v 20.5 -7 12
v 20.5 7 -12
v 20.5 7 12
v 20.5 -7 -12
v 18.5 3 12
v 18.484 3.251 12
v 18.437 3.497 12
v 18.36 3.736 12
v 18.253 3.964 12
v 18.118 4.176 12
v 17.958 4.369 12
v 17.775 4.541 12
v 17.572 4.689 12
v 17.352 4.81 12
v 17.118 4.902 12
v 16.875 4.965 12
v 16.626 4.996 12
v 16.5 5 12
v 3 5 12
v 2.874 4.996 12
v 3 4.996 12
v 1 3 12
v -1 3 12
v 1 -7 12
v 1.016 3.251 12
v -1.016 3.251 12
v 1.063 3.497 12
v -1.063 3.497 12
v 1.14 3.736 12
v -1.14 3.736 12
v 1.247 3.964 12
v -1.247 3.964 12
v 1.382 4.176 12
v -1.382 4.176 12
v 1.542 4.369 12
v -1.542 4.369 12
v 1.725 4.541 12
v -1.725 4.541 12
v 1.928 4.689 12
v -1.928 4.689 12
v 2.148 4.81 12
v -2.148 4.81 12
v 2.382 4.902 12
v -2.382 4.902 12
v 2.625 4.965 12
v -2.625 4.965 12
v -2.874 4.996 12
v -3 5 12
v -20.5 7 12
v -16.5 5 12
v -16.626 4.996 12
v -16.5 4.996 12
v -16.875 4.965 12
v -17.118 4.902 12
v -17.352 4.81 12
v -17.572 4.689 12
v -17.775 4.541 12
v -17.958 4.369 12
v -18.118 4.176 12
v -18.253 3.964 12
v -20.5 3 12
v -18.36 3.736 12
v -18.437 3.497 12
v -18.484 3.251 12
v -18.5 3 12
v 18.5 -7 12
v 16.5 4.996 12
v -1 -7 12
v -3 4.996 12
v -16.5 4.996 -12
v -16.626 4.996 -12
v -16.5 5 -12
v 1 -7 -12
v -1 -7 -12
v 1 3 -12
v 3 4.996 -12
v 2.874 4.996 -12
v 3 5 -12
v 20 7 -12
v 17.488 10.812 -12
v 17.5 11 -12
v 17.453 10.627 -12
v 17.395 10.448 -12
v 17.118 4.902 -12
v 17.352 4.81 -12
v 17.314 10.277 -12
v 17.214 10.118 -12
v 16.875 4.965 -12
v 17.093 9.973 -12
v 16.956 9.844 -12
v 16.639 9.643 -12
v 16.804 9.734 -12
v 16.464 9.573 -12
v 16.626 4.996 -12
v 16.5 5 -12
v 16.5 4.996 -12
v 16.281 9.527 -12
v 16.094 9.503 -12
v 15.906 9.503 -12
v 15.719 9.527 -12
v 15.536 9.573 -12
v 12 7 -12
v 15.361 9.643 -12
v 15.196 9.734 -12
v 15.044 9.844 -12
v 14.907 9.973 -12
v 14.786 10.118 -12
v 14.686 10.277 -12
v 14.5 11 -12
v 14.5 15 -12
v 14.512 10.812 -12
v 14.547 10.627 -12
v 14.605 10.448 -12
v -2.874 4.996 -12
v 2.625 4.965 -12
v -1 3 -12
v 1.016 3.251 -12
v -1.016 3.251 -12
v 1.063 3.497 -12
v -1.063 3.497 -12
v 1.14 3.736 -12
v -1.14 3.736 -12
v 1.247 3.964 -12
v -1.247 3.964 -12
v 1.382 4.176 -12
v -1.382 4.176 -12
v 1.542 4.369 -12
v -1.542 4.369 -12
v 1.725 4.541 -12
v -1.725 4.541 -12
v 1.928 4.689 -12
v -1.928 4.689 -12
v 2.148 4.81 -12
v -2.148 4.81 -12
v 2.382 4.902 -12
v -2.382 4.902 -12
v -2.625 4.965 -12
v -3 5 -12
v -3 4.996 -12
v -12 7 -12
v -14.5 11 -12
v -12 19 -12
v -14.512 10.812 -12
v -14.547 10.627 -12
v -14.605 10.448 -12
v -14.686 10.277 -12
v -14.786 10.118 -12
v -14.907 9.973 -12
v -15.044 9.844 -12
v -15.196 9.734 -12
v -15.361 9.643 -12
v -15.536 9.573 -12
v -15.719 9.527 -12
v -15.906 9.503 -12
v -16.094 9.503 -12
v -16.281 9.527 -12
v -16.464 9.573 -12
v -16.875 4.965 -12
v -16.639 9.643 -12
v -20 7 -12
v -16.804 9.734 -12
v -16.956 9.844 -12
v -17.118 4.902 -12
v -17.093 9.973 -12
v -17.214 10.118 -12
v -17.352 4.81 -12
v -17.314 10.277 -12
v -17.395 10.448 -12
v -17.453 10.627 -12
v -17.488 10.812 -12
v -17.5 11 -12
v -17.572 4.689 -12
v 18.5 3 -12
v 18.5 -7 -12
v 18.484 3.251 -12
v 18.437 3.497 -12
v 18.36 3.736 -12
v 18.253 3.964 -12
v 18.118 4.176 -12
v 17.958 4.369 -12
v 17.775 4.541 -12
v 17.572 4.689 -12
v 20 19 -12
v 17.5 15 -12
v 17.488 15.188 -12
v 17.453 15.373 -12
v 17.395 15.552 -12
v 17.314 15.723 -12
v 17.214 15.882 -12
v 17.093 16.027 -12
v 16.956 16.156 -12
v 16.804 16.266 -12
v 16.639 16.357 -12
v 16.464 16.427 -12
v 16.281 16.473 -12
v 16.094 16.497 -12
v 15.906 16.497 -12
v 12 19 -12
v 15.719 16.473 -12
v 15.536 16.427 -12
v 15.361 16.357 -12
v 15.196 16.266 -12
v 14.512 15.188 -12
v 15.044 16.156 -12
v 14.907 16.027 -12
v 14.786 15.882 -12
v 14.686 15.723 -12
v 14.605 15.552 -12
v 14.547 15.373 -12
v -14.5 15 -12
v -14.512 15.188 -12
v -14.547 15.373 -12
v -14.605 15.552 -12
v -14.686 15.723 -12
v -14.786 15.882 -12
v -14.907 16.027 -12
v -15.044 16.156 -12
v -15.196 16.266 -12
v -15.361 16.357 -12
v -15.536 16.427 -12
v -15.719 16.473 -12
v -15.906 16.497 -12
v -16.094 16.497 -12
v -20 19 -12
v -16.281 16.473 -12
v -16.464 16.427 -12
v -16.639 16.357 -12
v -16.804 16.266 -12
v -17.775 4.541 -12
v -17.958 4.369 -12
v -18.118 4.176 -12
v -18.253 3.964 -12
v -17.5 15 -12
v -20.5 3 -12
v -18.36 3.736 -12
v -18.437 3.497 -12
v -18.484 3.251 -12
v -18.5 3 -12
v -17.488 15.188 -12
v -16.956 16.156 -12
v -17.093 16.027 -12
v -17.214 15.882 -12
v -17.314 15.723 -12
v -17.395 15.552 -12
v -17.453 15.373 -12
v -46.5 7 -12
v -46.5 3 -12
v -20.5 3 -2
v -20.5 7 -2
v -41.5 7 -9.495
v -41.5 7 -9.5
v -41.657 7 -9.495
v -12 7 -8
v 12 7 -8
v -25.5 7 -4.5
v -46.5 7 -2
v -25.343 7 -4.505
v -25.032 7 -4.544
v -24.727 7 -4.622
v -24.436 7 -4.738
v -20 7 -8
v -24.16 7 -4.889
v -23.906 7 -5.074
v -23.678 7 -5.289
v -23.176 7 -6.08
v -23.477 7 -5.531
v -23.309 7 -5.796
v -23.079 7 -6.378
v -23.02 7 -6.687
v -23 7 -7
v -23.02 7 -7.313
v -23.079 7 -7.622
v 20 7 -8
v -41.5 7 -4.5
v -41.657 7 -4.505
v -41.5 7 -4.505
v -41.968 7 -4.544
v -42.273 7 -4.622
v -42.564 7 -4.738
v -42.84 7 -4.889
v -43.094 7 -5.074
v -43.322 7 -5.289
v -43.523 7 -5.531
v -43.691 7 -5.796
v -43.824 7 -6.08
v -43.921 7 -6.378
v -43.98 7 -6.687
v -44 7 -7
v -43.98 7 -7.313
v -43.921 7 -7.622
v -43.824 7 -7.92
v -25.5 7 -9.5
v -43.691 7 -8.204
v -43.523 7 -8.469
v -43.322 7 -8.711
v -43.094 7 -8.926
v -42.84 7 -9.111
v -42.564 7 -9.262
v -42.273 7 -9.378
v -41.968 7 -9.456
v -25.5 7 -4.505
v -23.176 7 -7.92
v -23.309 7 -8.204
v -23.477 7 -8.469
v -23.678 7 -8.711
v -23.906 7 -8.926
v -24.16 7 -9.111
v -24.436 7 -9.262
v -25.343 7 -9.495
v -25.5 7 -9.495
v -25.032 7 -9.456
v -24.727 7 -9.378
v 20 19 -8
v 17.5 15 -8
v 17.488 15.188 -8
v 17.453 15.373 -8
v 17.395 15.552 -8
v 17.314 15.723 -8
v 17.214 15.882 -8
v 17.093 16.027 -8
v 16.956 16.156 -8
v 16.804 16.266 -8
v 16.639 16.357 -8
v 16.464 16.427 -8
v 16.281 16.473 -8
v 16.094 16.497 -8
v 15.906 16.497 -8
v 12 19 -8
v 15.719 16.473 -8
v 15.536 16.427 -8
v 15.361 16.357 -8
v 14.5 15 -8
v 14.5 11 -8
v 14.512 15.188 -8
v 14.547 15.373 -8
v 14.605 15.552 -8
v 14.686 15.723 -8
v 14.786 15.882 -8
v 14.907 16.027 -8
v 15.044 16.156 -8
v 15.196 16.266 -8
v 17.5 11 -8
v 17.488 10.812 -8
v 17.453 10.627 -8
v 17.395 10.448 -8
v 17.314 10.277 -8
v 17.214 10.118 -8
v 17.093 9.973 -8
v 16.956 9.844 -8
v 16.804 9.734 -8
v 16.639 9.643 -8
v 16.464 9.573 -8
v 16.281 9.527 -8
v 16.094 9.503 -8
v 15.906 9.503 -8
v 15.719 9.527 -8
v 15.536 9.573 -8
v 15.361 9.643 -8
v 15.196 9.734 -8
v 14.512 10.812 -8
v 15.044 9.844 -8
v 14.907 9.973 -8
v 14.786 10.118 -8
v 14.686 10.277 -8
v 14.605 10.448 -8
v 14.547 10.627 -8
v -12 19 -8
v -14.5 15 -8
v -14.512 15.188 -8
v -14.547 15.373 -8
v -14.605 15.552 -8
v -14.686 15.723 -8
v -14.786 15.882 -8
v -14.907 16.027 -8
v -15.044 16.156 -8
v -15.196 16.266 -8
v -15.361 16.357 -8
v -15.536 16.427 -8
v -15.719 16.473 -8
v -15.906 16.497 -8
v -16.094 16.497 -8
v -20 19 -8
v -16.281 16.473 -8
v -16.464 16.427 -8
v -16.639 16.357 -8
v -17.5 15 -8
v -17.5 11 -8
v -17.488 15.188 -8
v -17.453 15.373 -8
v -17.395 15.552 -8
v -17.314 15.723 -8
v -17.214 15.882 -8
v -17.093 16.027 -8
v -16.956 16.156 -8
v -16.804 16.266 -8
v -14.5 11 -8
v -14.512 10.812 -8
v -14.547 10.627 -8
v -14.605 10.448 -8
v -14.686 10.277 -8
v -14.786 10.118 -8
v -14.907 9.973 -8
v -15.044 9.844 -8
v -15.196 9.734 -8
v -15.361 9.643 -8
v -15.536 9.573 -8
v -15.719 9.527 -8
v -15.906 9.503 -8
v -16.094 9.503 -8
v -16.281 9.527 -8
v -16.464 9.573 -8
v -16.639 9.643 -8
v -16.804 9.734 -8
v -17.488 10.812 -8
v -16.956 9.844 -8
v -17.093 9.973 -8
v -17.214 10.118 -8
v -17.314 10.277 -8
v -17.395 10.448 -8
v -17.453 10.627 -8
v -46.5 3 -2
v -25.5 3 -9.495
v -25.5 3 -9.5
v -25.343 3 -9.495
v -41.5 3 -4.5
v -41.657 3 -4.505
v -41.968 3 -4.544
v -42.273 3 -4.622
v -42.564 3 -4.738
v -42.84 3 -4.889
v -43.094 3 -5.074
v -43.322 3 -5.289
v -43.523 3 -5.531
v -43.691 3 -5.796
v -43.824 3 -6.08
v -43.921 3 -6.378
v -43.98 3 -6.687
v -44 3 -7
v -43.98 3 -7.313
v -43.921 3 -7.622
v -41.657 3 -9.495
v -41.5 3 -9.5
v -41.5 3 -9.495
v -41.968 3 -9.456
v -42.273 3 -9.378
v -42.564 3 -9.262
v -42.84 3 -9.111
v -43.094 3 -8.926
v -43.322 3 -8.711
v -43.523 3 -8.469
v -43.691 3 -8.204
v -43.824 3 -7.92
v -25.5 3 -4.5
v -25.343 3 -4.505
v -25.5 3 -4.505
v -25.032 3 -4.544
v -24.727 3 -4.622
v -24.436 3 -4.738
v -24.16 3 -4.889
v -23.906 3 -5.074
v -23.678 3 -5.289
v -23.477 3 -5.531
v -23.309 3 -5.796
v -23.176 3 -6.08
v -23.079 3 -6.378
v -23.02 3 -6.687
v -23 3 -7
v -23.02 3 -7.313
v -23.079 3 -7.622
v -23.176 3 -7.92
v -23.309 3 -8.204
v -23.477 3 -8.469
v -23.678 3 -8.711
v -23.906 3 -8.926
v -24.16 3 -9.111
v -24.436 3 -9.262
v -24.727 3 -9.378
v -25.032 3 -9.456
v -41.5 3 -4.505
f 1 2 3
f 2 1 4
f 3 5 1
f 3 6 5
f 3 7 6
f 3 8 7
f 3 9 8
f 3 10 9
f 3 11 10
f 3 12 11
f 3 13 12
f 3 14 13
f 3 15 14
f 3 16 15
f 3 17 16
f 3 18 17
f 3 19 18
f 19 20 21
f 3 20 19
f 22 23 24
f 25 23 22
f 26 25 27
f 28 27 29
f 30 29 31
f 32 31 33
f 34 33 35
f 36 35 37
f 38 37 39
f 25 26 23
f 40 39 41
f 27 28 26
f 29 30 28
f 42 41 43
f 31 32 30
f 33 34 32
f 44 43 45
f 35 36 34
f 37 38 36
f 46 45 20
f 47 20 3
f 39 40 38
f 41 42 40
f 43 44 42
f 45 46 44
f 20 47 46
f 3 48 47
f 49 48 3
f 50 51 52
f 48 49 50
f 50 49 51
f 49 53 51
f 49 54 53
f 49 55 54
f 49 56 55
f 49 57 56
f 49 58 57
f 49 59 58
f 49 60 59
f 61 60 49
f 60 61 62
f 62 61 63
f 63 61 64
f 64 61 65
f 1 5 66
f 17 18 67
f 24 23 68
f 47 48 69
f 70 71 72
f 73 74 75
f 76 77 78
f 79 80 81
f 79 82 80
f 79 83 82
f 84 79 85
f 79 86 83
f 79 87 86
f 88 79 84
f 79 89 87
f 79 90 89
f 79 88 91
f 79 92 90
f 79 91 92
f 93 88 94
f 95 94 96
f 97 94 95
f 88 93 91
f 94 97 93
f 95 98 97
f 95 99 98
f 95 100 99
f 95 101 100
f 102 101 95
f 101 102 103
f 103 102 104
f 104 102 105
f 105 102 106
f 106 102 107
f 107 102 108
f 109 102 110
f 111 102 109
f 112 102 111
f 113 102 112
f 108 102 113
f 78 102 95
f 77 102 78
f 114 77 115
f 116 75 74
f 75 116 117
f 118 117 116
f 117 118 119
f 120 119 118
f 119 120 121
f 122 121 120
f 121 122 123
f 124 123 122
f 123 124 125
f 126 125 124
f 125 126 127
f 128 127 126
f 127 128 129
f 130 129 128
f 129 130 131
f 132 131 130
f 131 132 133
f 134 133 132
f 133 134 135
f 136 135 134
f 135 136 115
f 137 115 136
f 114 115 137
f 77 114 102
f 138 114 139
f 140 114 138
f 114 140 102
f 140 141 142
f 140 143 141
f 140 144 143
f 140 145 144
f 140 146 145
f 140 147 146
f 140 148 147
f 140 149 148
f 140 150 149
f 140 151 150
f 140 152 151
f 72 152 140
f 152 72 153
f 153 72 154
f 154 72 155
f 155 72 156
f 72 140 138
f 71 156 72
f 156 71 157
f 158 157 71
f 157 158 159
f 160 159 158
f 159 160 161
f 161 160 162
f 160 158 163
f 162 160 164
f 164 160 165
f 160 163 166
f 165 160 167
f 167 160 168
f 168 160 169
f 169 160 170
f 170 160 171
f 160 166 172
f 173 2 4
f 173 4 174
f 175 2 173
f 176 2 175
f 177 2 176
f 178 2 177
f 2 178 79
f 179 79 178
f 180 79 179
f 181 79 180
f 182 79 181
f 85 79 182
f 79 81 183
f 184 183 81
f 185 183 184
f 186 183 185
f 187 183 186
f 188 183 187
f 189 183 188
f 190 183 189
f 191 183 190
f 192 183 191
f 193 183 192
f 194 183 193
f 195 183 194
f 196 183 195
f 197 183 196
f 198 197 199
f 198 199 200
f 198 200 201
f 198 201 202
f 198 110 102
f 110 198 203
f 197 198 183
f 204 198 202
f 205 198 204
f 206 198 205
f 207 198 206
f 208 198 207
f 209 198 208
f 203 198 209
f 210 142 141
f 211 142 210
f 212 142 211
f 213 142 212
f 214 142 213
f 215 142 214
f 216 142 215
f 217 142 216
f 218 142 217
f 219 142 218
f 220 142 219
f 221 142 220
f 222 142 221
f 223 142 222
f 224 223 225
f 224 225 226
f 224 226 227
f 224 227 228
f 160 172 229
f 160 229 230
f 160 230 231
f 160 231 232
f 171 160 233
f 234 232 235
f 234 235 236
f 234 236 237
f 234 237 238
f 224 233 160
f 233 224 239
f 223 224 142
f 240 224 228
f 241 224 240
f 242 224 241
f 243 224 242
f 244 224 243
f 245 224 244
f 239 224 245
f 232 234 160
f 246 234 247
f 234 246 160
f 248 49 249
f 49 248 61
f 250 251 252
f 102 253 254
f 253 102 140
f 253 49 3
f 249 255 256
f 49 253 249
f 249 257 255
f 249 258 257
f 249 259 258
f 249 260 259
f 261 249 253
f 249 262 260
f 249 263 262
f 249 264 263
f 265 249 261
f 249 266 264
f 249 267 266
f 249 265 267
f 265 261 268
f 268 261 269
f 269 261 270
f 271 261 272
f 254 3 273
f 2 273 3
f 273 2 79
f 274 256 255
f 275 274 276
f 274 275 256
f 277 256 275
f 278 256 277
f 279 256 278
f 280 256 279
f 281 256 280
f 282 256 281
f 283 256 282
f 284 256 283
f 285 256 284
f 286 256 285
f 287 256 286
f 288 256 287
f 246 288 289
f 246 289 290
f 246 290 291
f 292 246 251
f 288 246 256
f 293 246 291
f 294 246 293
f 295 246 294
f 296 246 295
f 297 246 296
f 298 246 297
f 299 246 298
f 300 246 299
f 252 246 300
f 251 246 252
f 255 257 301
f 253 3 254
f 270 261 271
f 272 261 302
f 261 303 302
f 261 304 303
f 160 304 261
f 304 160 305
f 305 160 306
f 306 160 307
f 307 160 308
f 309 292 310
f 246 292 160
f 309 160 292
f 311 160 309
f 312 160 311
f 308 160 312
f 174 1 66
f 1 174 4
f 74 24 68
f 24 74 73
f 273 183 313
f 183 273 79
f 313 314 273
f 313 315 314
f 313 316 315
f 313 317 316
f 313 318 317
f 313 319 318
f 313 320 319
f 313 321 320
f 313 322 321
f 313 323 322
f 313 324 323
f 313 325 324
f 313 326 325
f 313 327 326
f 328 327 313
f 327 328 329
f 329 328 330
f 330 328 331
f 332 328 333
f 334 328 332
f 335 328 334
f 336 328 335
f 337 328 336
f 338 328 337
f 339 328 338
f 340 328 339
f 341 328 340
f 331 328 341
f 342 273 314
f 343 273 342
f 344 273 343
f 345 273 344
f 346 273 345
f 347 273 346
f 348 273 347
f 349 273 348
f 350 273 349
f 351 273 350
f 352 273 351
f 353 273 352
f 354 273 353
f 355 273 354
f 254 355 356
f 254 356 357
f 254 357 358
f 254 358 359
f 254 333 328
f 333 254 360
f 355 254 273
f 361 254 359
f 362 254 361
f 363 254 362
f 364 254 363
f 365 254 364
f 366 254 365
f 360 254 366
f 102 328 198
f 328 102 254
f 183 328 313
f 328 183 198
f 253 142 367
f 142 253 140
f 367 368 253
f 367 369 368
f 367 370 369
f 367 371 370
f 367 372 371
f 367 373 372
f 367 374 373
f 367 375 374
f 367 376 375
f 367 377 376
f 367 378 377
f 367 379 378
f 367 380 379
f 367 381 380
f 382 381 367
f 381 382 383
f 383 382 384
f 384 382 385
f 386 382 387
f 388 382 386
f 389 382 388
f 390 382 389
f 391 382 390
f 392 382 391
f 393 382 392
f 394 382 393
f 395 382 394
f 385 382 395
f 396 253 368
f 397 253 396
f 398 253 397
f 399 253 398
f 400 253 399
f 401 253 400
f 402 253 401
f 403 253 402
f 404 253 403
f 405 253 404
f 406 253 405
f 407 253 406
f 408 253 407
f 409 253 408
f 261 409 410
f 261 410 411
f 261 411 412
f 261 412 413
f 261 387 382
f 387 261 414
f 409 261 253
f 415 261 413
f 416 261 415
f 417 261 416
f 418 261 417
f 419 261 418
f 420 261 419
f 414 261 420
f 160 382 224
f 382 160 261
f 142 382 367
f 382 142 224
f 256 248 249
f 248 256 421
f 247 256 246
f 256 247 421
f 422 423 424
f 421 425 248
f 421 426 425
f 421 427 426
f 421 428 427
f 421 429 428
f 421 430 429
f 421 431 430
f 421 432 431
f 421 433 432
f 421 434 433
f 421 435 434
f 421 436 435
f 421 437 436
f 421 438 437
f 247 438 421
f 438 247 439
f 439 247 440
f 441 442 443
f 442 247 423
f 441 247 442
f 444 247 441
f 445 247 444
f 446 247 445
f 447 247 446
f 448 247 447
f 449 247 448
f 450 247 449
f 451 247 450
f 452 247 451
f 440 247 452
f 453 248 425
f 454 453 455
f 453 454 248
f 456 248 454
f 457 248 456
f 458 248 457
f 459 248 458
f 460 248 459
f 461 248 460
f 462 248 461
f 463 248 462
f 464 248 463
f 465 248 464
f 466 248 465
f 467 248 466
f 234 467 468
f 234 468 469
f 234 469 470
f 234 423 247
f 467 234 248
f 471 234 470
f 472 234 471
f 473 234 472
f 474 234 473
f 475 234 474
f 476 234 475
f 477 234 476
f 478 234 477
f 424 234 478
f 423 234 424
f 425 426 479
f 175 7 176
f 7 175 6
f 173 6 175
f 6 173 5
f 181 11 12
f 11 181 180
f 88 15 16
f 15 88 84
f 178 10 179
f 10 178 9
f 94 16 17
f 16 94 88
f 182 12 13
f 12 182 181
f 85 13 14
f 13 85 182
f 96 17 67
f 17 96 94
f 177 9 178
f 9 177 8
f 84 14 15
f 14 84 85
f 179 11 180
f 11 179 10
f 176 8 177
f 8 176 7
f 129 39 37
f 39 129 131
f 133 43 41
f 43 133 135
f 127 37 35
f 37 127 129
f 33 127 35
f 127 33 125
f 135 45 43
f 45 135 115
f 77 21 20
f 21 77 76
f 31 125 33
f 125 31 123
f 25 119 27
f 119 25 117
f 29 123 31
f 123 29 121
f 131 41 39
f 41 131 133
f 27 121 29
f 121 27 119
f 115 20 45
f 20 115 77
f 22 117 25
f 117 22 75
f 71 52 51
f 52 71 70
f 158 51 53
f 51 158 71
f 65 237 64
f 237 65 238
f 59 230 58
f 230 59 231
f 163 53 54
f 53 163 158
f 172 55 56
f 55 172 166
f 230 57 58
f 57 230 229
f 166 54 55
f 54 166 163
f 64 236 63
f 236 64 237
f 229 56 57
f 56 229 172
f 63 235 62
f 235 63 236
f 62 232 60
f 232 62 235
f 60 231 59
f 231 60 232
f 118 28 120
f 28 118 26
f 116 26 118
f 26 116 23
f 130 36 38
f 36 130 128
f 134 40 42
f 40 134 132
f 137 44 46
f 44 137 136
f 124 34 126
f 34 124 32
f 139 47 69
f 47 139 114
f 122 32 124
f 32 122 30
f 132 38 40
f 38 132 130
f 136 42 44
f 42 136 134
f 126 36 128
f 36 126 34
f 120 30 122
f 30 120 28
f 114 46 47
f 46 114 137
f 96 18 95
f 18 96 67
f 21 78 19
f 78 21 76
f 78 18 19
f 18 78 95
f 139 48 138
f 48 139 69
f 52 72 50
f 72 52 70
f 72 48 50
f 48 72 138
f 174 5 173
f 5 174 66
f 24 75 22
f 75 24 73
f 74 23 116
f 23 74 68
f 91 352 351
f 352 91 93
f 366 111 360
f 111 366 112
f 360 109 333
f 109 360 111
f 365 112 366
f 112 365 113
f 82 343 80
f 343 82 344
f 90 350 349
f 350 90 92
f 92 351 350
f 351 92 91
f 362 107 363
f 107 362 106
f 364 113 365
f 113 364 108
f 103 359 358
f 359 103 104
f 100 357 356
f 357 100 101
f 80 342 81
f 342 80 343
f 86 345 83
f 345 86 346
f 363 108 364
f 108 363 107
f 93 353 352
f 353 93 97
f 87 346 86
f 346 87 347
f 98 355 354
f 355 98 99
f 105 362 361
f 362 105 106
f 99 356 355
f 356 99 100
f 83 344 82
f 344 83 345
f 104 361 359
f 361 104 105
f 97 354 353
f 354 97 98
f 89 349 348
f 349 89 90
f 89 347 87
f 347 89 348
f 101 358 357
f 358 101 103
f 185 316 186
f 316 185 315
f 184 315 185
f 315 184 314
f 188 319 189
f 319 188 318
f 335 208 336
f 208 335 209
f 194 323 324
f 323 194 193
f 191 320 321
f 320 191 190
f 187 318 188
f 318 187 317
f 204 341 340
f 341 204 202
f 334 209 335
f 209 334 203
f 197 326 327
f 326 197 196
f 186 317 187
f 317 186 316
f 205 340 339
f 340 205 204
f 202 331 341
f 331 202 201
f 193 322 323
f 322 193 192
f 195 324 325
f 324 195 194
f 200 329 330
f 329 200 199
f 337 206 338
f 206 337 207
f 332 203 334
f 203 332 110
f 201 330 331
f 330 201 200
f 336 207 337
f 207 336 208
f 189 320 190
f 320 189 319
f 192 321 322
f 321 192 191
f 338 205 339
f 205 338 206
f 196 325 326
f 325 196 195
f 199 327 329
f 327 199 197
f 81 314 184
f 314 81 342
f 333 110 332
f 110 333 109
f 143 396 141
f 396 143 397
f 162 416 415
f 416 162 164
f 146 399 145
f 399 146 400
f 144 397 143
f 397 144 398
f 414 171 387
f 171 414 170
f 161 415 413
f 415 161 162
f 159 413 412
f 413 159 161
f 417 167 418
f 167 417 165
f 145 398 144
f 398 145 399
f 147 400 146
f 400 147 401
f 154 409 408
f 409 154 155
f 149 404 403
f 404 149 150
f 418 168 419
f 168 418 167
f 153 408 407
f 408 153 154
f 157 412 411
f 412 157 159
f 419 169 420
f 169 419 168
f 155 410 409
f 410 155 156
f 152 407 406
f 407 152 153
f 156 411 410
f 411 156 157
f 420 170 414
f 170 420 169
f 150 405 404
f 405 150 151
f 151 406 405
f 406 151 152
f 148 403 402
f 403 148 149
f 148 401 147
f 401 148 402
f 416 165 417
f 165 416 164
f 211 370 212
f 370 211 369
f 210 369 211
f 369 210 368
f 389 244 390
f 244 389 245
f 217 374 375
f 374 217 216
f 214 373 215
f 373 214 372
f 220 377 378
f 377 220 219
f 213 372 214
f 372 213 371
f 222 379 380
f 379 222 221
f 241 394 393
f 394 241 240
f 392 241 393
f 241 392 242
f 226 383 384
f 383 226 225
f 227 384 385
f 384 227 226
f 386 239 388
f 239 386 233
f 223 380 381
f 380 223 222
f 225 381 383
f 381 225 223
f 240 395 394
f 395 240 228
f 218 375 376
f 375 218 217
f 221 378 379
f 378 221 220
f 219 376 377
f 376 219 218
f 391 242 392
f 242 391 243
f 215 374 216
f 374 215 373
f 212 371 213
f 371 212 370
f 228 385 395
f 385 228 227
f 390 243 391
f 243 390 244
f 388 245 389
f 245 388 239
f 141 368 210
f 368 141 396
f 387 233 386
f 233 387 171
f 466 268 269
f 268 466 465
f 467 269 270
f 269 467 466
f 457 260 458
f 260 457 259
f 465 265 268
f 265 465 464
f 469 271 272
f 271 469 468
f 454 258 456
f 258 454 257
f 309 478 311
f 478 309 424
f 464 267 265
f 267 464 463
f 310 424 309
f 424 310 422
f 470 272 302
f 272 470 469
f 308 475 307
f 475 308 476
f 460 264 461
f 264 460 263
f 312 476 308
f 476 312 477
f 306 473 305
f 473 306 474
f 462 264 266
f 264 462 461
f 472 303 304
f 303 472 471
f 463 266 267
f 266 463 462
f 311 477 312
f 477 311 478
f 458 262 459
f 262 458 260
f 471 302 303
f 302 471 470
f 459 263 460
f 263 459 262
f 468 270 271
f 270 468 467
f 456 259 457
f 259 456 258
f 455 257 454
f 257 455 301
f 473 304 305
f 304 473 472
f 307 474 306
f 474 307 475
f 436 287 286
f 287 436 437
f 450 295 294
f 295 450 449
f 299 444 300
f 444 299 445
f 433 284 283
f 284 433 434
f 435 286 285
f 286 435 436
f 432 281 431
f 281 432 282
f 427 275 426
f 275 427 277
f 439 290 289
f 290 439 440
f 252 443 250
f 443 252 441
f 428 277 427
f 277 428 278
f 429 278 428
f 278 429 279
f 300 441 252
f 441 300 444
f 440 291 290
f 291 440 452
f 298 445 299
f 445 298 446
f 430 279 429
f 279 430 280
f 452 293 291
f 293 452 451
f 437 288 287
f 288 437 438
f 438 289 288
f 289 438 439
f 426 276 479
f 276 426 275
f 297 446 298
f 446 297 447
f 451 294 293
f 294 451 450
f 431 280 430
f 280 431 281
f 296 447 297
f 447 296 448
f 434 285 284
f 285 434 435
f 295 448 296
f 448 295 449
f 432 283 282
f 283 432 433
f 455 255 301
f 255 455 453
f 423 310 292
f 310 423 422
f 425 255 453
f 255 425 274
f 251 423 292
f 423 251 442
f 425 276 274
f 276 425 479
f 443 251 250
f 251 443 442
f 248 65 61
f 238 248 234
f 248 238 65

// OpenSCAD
// meter2 mount

// meter oriented on it's back
meter_x = 41;
meter_y = 41;
meter_z = 26;

// original m3 x 8mm
// cut screws 8 + m3_block_z + 1 (washer)
screw_square = 32;
m3_slot = 4;

m3_block_y = 8 + m3_slot;
m3_block_x = 8;
m3_block_z = 4;
echo ("cut m3 screws to:", 8 + m3_block_z + 1);

meter_y_mnt_hgt_actual = 16;
meter_y_mnt_hgt_range = m3_slot;
meter_y_mnt_hgt = meter_y_mnt_hgt_actual - meter_y_mnt_hgt_range/2;
meter_z_base = 20 + m3_block_z;   // base won't be entire dimension



m3_dia = 3.0;
m3_washer_dia = 9;

m5_dia = 5.0;

meter2_block_z = 9 + 1;  // add 1 for a washer/shim
meter2_x = 26;
meter2_y = 4;
meter2_z = 5 + 5;

$fn = 50;

difference () {
    {
    union () {
        // main billet
        cube([meter_x, meter_y_mnt_hgt, meter_z_base], center = true);

        // (2) m3 mounting blocks
        translate([(screw_square/2),
            meter_y_mnt_hgt/2 + m3_block_y/2,
            -meter_z_base/2 + m3_block_z/2])
        cube([m3_block_x, m3_block_y, m3_block_z], center = true);
        
        translate([-(screw_square/2),
            meter_y_mnt_hgt/2 + m3_block_y/2,
            -meter_z_base/2 + m3_block_z/2])
        cube([m3_block_x, m3_block_y, m3_block_z], center = true);
        
        // meter 2 tang
        tang_trans_y = (meter_y_mnt_hgt/2 - meter2_block_z - meter2_y/2);
        tang_hgt = meter_y_mnt_hgt/2 -tang_trans_y - meter2_y/2;
        echo("tang hgt:", tang_hgt);
        
        translate([-(meter_x/2 + meter2_x/2), 
            -(tang_trans_y), 
            -(meter_z_base/2 - meter2_z/2)])
        cube([meter2_x, meter2_y, meter2_z], center = true); 
        }
    }
    // subtract 
    {
        // arches
        // - corners
        corner_trans_x = (meter_x/2 - 4);
        corner_trans_x2 = 2 + 1;  // radius + 1; 1 because it's half
        corner_trans_y = (meter_y_mnt_hgt/2 - 4);
        echo("corner hole x/y", corner_trans_x, corner_trans_y);
        
        translate([corner_trans_x, 
            corner_trans_y, 
            0])
        cylinder(r = 2, h = meter_z_base, center = true);
        
        translate([corner_trans_x2, 
            corner_trans_y, 
            0])
        cylinder(r = 2, h = meter_z_base, center = true);
        
        translate([-corner_trans_x, 
            corner_trans_y, 
            0])
        cylinder(r = 2, h = meter_z_base, center = true);
        
        translate([-corner_trans_x2, 
            corner_trans_y, 
            0])
        cylinder(r = 2, h = meter_z_base, center = true);
        
        // top 2 cubes
        top_cube_x = corner_trans_x - corner_trans_x2;
        translate([(corner_trans_x - top_cube_x/2),
            corner_trans_y, 
            0 ])
        cube([top_cube_x, 4, meter_z_base], center = true);
        
        translate([-(corner_trans_x - top_cube_x/2),
            corner_trans_y, 
            0 ])
        cube([top_cube_x, 4, meter_z_base], center = true);
        
        bottom_cube_x = top_cube_x + 4;
        bottom_cube_y = corner_trans_y + meter_y_mnt_hgt/2;
        
        bottom_cube_trans_x = (corner_trans_x + 2) - bottom_cube_x/2;
        bottom_cube_trans_y = -meter_y_mnt_hgt/2 + bottom_cube_y/2;
        
        translate([bottom_cube_trans_x, bottom_cube_trans_y, 0])
        cube([bottom_cube_x, bottom_cube_y, meter_z_base], center = true);
        
        translate([-bottom_cube_trans_x, bottom_cube_trans_y, 0])
        cube([bottom_cube_x, bottom_cube_y, meter_z_base], center = true);
        
        //m3 holes for meter back
        translate([screw_square/2,
            meter_y_mnt_hgt/2 + 4,
            -meter_z_base/2 + m3_block_z/2])
        cylinder(r = m3_dia/2, h = m3_block_z, center = true);
        
        translate([screw_square/2,
            meter_y_mnt_hgt/2 + 4 + m3_slot,
            -meter_z_base/2 + m3_block_z/2])
        cylinder(r = m3_dia/2, h = m3_block_z, center = true);
        
        translate([screw_square/2,
            meter_y_mnt_hgt/2 + 4 + m3_slot/2,
            -meter_z_base/2 + m3_block_z/2])
        cube([m3_dia, m3_slot, m3_block_z], center = true);
        
        // 2nd
        translate([-screw_square/2,
            meter_y_mnt_hgt/2 + 4,
            -meter_z_base/2 + m3_block_z/2])
        cylinder(r = m3_dia/2, h = m3_block_z, center = true);
        
        translate([-screw_square/2,
            meter_y_mnt_hgt/2 + 4 + m3_slot,
            -meter_z_base/2 + m3_block_z/2])
        cylinder(r = m3_dia/2, h = m3_block_z, center = true);
        
        translate([-screw_square/2,
            meter_y_mnt_hgt/2 + 4 + m3_slot/2,
            -meter_z_base/2 + m3_block_z/2])
        cube([m3_dia, m3_slot, m3_block_z], center = true);
        
        // meter 2 tang - m5 slot
        translate([-(meter_x/2 + 5),
            0,
            -(meter_z_base/2 - meter2_z/2)])
        rotate([90,0,0])
        cylinder(r = m5_dia/2, h = meter_y_mnt_hgt, center = true);
        
        translate([-(meter_x/2 + meter2_x - 5),
            0,
            -(meter_z_base/2 - meter2_z/2)])
        rotate([90,0,0])
        cylinder(r = m5_dia/2, h = meter_y_mnt_hgt, center = true);
        
        translate([-(meter_x/2 + meter2_x/2),
            0,
            -(meter_z_base/2 - meter2_z/2)])
        cube([meter2_x - 10, meter_y_mnt_hgt, 5], center = true);
        
        // remove the left leg
        // - get tang_hgt (out of scope) value from echo log
        tang_hgt = 10;
        translate([-(meter_x/2 - 5/2), 
            -(meter_y_mnt_hgt/2 - tang_hgt/2), 
            0])
        #cube([5, tang_hgt, meter_z_base], center = true);
    }
}
